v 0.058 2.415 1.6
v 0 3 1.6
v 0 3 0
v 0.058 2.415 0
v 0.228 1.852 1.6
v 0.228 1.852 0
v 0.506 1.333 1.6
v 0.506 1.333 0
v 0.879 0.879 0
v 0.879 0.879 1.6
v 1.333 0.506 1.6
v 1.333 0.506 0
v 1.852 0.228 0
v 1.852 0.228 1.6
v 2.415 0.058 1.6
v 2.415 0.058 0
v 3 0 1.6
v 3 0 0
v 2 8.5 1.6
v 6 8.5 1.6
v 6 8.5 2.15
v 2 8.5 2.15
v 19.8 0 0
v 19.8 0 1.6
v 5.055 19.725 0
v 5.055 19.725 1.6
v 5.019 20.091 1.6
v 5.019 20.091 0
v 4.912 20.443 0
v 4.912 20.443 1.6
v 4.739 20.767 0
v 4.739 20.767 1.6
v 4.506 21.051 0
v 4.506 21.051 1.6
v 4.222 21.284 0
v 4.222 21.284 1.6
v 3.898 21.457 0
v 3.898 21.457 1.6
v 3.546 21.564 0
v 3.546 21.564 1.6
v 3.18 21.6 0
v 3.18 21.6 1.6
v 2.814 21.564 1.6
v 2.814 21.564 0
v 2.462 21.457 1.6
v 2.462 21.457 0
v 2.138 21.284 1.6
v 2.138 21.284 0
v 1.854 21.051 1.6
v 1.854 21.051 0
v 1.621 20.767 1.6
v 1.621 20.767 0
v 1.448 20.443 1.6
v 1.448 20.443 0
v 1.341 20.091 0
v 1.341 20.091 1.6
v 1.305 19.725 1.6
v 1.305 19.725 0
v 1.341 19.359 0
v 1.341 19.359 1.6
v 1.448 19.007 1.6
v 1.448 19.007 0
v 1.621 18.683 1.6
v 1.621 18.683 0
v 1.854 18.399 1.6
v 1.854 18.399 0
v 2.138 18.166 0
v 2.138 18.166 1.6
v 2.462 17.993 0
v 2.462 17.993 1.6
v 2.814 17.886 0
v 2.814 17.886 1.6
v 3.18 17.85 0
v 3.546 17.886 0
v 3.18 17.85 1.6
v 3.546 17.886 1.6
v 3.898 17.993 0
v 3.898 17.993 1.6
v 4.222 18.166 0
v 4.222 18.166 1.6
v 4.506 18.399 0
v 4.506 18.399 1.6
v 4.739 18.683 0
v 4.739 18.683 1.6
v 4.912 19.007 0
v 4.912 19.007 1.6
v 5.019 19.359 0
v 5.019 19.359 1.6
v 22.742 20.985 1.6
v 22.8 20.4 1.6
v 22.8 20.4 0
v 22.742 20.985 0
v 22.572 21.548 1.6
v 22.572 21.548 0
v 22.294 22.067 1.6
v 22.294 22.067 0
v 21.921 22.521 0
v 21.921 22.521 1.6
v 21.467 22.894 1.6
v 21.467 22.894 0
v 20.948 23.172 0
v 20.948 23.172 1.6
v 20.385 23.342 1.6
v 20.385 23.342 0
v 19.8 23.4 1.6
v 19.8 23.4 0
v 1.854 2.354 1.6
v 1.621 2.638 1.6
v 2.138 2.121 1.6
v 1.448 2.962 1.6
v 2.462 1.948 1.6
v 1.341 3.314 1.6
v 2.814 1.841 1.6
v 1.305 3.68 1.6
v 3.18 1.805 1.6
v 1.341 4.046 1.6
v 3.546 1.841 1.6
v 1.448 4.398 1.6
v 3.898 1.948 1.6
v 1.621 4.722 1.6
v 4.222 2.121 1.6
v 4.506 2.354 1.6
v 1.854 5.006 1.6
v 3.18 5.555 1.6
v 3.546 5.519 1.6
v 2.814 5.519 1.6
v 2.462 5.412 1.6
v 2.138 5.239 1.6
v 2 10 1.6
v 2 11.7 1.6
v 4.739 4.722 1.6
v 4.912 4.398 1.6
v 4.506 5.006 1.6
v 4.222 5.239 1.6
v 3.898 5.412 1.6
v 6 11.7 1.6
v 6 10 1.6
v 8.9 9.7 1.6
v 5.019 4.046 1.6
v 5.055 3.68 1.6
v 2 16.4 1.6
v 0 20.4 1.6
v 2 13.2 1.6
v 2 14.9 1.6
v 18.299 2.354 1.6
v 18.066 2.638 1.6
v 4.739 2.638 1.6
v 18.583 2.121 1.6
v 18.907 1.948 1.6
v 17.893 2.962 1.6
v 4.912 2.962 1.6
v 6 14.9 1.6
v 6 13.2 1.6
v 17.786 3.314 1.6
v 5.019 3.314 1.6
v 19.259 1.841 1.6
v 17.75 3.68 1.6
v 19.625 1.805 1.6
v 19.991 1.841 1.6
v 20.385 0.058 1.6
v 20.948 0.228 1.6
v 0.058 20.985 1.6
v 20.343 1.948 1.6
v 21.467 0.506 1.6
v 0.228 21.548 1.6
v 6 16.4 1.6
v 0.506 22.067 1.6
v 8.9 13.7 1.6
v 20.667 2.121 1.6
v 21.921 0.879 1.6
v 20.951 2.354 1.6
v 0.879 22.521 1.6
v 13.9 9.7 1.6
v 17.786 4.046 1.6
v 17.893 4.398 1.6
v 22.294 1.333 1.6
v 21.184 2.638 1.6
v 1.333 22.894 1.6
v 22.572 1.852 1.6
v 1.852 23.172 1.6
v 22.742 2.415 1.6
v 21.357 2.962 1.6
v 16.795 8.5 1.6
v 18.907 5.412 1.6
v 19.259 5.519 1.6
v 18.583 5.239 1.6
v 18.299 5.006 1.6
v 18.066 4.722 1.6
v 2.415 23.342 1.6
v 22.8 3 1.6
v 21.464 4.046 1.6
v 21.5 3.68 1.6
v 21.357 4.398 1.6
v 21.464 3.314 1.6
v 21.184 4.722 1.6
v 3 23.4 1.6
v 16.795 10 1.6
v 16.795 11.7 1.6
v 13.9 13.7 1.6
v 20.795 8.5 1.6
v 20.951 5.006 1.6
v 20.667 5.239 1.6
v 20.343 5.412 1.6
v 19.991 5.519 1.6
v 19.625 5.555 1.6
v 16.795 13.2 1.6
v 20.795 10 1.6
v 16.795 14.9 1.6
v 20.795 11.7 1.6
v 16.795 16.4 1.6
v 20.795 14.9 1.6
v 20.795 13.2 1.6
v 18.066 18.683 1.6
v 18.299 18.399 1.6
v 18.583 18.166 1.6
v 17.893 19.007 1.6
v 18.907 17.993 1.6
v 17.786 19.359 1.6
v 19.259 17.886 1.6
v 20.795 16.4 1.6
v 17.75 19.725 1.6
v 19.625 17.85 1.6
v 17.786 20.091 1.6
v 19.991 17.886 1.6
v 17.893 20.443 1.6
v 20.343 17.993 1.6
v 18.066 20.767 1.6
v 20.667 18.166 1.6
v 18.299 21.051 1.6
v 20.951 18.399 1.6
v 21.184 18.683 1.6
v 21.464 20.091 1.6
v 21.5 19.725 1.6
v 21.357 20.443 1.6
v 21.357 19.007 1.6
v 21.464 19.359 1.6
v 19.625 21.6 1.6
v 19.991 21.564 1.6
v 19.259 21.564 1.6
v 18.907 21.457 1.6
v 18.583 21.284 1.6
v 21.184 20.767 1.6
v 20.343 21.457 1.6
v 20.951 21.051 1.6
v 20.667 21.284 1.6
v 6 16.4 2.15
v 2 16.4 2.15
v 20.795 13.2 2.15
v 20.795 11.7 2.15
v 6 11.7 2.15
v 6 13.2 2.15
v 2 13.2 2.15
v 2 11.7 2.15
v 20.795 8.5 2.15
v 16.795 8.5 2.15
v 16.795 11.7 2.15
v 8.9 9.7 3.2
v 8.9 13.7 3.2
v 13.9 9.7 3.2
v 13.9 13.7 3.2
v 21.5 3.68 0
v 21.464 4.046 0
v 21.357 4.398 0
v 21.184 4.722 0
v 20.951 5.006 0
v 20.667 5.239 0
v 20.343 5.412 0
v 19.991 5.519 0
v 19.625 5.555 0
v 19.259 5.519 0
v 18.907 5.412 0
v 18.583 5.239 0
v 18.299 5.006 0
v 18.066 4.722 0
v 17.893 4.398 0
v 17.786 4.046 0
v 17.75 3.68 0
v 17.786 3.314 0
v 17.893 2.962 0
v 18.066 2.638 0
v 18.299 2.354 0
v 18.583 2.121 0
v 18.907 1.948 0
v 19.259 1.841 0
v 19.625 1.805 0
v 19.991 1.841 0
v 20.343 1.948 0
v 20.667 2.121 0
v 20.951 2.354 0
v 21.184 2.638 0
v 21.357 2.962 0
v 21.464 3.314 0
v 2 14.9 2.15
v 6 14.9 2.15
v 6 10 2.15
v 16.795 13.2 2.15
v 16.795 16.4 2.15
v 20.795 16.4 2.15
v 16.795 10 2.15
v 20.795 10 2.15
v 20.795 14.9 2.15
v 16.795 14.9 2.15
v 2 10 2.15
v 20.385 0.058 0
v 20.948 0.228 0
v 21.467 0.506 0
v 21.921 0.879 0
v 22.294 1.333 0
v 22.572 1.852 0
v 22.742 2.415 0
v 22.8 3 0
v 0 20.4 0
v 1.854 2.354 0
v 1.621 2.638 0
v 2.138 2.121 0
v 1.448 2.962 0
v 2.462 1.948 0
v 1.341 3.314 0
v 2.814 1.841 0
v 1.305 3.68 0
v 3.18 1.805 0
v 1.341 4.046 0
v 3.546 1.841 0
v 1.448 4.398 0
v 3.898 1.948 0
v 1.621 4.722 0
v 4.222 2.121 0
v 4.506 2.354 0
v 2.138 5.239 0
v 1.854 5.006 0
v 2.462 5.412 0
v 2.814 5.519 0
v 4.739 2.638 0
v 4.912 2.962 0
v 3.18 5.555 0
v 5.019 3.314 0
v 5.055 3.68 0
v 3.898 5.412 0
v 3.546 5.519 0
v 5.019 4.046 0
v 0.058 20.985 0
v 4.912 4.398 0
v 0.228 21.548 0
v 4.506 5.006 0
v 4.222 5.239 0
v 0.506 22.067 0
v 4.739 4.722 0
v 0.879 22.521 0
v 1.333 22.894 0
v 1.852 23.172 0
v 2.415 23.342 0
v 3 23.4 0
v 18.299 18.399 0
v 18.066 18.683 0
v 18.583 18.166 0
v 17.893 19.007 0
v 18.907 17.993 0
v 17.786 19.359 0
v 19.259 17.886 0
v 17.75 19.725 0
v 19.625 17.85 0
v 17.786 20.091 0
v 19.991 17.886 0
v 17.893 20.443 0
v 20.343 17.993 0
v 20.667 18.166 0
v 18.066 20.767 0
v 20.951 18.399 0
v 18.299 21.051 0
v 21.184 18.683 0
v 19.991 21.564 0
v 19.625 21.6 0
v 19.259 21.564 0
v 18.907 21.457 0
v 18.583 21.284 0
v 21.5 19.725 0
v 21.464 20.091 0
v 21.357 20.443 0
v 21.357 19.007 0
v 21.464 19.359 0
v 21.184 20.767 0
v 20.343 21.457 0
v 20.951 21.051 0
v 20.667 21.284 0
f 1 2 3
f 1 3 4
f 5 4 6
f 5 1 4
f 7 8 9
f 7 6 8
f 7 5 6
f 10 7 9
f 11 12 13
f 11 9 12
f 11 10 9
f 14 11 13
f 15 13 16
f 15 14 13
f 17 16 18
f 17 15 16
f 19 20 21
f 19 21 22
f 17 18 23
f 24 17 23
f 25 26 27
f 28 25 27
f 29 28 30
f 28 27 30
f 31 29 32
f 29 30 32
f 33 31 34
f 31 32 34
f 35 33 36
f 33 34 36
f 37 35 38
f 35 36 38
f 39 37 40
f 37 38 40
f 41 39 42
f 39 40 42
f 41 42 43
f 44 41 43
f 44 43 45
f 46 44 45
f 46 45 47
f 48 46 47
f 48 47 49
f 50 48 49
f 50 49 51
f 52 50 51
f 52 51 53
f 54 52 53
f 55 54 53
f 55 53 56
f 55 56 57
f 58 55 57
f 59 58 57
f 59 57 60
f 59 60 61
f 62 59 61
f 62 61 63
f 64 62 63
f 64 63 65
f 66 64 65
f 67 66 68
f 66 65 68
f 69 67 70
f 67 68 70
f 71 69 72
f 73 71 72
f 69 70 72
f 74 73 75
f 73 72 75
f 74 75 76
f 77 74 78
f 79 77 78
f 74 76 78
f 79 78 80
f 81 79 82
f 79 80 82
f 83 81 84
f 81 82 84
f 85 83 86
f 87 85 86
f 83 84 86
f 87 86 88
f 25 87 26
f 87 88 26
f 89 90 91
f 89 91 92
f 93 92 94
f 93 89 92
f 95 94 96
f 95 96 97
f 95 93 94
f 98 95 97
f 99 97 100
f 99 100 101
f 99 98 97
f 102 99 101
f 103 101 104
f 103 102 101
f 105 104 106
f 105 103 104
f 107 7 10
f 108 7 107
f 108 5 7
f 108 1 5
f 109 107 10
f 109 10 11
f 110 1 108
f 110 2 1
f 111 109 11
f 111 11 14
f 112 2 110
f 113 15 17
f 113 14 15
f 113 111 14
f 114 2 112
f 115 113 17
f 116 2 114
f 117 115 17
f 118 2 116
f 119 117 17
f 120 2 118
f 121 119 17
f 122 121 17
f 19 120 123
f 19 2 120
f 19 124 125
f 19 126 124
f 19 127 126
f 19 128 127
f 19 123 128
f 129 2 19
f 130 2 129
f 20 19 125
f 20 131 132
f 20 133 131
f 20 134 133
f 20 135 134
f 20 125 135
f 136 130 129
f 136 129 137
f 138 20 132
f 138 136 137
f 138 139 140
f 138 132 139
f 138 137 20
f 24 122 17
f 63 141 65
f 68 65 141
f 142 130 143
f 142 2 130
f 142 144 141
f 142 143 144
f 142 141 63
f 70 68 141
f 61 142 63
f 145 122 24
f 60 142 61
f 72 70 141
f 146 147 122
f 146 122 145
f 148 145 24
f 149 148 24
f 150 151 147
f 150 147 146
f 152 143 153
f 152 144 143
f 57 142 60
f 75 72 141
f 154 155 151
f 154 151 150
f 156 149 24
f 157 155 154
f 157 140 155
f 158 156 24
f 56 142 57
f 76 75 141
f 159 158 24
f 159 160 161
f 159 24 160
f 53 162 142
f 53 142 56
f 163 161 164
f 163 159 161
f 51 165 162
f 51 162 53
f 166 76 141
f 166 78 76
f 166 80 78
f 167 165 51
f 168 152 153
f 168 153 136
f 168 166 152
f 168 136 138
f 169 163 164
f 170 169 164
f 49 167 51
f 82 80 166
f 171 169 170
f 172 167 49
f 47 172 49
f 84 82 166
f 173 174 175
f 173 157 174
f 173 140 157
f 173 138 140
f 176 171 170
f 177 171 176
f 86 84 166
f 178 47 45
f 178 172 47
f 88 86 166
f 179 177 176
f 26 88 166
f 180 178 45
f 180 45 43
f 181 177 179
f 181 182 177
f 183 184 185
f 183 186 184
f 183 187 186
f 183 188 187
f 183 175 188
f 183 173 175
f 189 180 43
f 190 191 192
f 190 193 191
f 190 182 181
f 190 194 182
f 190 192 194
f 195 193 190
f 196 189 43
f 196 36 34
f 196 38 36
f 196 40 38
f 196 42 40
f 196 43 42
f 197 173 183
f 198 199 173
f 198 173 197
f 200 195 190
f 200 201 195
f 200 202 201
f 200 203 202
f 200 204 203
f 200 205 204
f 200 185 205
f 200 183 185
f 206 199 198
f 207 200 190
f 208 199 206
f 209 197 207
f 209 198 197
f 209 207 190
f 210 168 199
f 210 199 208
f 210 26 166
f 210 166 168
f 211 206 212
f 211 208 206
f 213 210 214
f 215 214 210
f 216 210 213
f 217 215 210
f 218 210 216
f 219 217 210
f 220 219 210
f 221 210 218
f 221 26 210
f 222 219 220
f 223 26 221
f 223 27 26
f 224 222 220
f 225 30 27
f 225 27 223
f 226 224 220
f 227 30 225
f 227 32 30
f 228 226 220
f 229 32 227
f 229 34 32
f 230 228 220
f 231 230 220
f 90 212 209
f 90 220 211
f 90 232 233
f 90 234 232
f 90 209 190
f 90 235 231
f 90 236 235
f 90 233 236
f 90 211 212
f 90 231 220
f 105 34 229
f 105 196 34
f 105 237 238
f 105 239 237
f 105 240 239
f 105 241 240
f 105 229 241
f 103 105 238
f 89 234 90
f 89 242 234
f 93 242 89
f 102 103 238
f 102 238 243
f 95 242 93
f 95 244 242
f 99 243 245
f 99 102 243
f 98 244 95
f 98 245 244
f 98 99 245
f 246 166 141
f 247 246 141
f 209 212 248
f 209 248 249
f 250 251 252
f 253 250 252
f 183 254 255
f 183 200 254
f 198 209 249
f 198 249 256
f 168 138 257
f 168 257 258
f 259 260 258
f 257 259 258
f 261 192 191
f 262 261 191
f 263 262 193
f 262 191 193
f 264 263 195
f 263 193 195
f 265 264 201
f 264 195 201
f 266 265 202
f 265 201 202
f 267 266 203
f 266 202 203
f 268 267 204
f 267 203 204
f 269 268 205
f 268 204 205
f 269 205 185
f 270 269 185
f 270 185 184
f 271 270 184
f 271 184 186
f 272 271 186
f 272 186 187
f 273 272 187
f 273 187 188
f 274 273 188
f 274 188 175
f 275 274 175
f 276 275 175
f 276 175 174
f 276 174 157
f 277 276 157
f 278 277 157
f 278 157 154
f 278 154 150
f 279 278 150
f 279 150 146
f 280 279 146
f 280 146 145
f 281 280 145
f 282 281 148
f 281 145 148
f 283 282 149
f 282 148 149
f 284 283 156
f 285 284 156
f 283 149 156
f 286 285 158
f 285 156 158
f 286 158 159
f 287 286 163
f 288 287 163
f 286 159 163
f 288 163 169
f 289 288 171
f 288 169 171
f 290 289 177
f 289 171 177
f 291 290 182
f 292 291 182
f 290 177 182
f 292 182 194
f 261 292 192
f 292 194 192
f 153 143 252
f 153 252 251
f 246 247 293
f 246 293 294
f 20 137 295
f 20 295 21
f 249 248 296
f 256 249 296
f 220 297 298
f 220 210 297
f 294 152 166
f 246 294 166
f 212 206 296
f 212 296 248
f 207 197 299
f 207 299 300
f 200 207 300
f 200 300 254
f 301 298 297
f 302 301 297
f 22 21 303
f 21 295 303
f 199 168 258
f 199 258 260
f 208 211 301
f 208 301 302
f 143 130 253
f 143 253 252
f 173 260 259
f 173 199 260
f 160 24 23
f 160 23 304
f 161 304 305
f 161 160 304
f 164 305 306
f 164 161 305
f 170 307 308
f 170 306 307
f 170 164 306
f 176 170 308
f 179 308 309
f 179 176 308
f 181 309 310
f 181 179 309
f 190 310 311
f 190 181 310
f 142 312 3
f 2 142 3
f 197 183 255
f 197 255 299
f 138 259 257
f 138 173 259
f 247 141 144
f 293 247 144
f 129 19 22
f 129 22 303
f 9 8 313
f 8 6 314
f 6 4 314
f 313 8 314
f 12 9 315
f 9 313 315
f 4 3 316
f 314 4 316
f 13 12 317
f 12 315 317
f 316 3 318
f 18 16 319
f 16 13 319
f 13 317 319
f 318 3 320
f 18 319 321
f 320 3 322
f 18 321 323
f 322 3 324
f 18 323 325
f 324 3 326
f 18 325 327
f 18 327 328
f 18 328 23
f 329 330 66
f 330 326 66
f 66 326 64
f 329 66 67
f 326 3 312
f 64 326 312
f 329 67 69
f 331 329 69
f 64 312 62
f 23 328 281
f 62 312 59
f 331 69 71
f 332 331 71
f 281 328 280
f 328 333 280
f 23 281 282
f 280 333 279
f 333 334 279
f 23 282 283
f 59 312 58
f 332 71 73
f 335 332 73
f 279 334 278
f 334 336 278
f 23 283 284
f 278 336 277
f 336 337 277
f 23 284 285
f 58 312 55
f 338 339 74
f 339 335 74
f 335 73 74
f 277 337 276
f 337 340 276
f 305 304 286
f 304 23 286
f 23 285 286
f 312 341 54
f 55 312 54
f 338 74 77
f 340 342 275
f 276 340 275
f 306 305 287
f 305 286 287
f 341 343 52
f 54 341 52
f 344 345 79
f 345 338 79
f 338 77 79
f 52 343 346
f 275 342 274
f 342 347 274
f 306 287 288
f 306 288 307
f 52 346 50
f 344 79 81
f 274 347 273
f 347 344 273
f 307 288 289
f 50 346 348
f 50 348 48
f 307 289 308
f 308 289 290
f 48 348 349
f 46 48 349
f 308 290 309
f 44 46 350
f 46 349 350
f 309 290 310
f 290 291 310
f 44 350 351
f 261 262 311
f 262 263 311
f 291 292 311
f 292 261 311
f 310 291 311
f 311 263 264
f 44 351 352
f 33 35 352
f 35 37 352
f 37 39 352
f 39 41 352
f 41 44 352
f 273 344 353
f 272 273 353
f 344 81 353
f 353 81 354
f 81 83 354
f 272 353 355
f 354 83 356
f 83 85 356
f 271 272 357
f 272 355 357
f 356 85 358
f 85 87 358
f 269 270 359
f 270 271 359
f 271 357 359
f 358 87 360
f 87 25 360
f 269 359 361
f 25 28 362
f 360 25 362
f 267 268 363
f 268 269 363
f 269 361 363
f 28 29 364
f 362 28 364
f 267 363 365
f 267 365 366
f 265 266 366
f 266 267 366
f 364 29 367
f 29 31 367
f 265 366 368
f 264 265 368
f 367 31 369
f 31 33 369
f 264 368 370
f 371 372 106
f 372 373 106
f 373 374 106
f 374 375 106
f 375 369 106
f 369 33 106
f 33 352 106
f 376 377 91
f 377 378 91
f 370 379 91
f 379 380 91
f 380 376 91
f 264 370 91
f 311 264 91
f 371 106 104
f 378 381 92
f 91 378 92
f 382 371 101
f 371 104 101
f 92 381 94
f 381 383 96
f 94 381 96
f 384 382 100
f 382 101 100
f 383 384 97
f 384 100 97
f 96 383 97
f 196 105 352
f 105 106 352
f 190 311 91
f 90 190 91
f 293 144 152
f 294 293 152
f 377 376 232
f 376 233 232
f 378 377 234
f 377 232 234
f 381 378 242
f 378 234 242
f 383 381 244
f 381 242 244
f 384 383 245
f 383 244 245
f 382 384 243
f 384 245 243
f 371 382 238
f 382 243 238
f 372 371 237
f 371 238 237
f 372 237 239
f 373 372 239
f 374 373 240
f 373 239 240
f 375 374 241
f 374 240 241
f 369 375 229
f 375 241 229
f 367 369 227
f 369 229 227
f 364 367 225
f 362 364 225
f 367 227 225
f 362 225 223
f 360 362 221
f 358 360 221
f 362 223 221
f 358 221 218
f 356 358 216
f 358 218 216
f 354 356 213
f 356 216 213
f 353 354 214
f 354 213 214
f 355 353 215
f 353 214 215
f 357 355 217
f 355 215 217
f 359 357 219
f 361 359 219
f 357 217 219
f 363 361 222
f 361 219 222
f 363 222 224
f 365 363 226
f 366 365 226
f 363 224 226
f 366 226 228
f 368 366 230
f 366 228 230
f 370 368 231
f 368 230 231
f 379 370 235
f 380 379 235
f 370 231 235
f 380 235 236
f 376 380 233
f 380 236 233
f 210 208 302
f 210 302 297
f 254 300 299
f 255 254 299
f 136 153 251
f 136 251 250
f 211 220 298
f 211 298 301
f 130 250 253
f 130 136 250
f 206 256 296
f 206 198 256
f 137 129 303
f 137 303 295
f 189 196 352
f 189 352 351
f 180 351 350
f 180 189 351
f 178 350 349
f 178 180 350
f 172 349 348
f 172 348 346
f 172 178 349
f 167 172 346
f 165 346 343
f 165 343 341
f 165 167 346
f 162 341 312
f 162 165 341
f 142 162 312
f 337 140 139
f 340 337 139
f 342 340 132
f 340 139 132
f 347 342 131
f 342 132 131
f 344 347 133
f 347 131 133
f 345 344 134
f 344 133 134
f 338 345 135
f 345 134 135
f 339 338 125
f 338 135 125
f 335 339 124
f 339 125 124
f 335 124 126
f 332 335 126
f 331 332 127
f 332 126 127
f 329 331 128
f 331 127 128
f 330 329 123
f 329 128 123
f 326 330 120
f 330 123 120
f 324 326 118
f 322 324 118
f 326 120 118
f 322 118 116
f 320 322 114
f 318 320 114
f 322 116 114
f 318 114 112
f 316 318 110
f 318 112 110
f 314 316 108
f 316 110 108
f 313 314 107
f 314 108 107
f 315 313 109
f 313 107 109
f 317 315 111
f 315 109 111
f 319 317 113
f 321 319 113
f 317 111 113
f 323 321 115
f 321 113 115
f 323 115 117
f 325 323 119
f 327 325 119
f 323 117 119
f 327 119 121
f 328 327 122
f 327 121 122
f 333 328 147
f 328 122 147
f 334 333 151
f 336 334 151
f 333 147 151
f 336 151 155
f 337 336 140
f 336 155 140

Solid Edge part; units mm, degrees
sketch "Sketch1" plane through (0, 0, 0) normal (0, 0, 1) x (1, 0, 0)
  line L0 (22.8, 0) -> (22.8, 23.4)
  line L1 (22.8, 23.4) -> (0, 23.4)
  line L2 (0, 23.4) -> (0, 0)
  line L3 (0, 0) -> (22.8, 0)
extrude "Protrusion1" add sketch "Sketch1" along normal blind 1.6
sketch "Sketch2" plane through (11.4, 11.7, 1.6) normal (0, 0, 1) x (1, 0, 0)
  circle A0 centre (-8.22, 8.025) radius 1.875
  circle A1 centre (8.225, 8.025) radius 1.875
  circle A2 centre (-8.22, -8.02) radius 1.875
  circle A3 centre (8.225, -8.02) radius 1.875
  dimension "D1" = 3.75
  dimension "D2" = 3.175
  dimension "D3" = 3.675
  dimension "D4" = 3.18
  dimension "D5" = 3.68
extrude "Cutout1" cut sketch "Sketch2" against normal up to next
sketch "Sketch3" plane through (11.4, 11.7, 1.6) normal (0, 0, 1) x (1, 0, 0)
  line L0 (2.5, -2) -> (-2.5, -2)
  line L1 (-2.5, -2) -> (-2.5, 2)
  line L2 (-2.5, 2) -> (2.5, 2)
  line L3 (2.5, 2) -> (2.5, -2)
extrude "ProtrusiónExtruida_2" add sketch "Sketch3" along normal blind 1.6
fillet "Redondeo_1" radius 3 4 edges at (22.8, 0, 0.8) (22.8, 23.4, 0.8) (0, 0, 0.8) (0, 23.4, 0.8)
sketch "Sketch4" plane through (11.4, 11.7, 1.6) normal (0, 0, 1) x (1, 0, 0)
  line L0 (5.3953, 4.7) -> (9.3953, 4.7)
  line L1 (9.3953, 4.7) -> (9.3953, 3.2)
  line L2 (9.3953, 3.2) -> (5.3953, 3.2)
  line L3 (5.3953, 3.2) -> (5.3953, 4.7)
  line L4 (9.3953, 0) -> (5.3953, 0)
  line L5 (5.3953, 0) -> (5.3953, 1.5)
  line L6 (5.3953, 1.5) -> (9.3953, 1.5)
  line L7 (9.3953, 1.5) -> (9.3953, 0)
  line L8 (5.3953, -1.7) -> (9.3953, -1.7)
  line L9 (9.3953, -1.7) -> (9.3953, -3.2)
  line L10 (9.3953, -3.2) -> (5.3953, -3.2)
  line L11 (5.3953, -3.2) -> (5.3953, -1.7)
  line L12 (-9.4, 3.2) -> (-5.4, 3.2)
  line L13 (-5.4, 3.2) -> (-5.4, 4.7)
  line L14 (-5.4, 4.7) -> (-9.4, 4.7)
  line L15 (-9.4, 4.7) -> (-9.4, 3.2)
  line L16 (-9.4, 1.5) -> (-5.4, 1.5)
  line L17 (-5.4, 1.5) -> (-5.4, 0)
  line L18 (-5.4, 0) -> (-9.4, 0)
  line L19 (-9.4, 0) -> (-9.4, 1.5)
  line L20 (-9.4, -1.7) -> (-5.4, -1.7)
  line L21 (-5.4, -1.7) -> (-5.4, -3.2)
  line L22 (-5.4, -3.2) -> (-9.4, -3.2)
  line L23 (-9.4, -3.2) -> (-9.4, -1.7)
  dimension "D1" = 4
  dimension "D2" = 1.5
  dimension "D3" = 1.7
  dimension "D4" = 1.7
  dimension "D5" = 2.0047
  dimension "D6" = 7
  dimension "D7" = 1.7
  dimension "D8" = 1.7
  dimension "D9" = 2
  dimension "D10" = 7
extrude "ProtrusiónExtruida_3" add sketch "Sketch4" along normal blind 0.55
